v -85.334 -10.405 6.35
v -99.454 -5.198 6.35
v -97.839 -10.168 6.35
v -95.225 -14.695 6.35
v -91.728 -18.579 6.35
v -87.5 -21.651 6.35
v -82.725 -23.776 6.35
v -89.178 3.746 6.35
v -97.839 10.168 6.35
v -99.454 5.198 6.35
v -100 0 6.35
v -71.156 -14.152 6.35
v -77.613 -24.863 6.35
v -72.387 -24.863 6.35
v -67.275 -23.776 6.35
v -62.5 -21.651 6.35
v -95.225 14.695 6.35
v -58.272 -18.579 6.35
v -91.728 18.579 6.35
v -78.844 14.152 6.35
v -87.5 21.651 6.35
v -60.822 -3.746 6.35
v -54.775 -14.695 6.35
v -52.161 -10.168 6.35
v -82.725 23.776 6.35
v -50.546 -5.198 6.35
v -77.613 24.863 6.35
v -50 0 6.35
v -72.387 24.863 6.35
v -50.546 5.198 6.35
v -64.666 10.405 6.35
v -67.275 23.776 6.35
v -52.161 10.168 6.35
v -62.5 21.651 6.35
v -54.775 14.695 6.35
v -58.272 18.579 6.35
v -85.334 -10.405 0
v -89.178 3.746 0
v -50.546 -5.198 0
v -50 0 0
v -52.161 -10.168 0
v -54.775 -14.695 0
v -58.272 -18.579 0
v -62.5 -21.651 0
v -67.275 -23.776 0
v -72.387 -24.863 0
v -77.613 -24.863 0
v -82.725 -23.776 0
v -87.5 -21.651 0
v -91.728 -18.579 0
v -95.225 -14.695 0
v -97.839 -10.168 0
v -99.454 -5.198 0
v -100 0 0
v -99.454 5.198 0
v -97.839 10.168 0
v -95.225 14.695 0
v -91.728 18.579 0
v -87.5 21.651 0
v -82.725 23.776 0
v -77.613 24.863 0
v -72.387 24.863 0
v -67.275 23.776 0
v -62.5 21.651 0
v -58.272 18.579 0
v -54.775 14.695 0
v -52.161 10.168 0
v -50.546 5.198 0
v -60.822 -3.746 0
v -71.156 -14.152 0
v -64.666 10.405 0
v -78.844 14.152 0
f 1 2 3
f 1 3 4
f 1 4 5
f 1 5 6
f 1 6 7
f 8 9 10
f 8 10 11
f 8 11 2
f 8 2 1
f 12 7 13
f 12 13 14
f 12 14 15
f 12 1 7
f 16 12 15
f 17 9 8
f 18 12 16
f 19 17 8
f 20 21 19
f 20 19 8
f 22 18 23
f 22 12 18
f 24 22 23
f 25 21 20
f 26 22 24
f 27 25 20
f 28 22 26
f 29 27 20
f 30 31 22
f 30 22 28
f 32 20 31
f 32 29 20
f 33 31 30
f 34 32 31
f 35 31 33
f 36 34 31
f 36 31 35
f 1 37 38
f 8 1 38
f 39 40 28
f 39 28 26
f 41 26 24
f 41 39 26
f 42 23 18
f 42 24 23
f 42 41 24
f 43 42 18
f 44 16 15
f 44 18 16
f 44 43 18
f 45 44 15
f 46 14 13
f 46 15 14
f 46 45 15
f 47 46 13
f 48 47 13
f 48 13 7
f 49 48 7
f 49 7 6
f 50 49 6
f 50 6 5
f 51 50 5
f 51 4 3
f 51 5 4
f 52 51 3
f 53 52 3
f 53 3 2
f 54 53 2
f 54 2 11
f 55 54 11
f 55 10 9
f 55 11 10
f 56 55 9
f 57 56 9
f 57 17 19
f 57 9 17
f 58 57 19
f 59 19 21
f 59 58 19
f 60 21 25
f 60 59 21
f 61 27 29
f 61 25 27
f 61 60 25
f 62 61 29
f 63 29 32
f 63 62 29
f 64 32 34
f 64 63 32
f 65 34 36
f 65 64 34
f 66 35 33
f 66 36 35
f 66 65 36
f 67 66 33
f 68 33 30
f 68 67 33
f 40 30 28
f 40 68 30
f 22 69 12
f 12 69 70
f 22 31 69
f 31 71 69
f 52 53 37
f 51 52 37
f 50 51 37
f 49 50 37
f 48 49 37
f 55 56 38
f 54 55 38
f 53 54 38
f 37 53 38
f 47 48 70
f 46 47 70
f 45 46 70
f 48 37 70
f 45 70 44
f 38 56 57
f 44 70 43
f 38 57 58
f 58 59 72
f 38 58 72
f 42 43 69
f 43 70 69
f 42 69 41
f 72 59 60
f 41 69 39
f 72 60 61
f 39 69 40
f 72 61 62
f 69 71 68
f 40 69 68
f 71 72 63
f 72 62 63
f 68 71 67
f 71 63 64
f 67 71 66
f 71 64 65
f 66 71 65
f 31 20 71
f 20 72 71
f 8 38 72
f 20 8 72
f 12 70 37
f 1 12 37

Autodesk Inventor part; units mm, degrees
ref_plane "YZ Plane" through (0, 0, 0) normal (1, 0, 0) x (0, 1, 0)
ref_plane "XZ Plane" through (0, 0, 0) normal (0, 1, 0) x (-1, 0, 0)
ref_plane "XY Plane" through (0, 0, 0) normal (0, 0, 1) x (1, 0, 0)
sketch "Sketch1" plane through (0, 0, 0) normal (0, 0, 1) x (1, 0, 0)
  circle A0 centre (-75, 0) radius 25
  circle A1 centre (-75, 0) radius 25
  line L0 (-78.8445, 14.1518) -> (-64.6664, 10.4053)
  line L1 (-64.6664, 10.4053) -> (-60.8219, -3.7465)
  line L2 (-60.8219, -3.7465) -> (-71.1555, -14.1518)
  line L3 (-71.1555, -14.1518) -> (-85.3336, -10.4053)
  line L4 (-85.3336, -10.4053) -> (-89.1781, 3.7465)
  line L5 (-89.1781, 3.7465) -> (-78.8445, 14.1518)
  point P0 (0, 0)
extrude "Extrusion1" add sketch "Sketch1" along normal blind 6.35
properties part number "1-4inch_KnifeSpacer_Piece1"
